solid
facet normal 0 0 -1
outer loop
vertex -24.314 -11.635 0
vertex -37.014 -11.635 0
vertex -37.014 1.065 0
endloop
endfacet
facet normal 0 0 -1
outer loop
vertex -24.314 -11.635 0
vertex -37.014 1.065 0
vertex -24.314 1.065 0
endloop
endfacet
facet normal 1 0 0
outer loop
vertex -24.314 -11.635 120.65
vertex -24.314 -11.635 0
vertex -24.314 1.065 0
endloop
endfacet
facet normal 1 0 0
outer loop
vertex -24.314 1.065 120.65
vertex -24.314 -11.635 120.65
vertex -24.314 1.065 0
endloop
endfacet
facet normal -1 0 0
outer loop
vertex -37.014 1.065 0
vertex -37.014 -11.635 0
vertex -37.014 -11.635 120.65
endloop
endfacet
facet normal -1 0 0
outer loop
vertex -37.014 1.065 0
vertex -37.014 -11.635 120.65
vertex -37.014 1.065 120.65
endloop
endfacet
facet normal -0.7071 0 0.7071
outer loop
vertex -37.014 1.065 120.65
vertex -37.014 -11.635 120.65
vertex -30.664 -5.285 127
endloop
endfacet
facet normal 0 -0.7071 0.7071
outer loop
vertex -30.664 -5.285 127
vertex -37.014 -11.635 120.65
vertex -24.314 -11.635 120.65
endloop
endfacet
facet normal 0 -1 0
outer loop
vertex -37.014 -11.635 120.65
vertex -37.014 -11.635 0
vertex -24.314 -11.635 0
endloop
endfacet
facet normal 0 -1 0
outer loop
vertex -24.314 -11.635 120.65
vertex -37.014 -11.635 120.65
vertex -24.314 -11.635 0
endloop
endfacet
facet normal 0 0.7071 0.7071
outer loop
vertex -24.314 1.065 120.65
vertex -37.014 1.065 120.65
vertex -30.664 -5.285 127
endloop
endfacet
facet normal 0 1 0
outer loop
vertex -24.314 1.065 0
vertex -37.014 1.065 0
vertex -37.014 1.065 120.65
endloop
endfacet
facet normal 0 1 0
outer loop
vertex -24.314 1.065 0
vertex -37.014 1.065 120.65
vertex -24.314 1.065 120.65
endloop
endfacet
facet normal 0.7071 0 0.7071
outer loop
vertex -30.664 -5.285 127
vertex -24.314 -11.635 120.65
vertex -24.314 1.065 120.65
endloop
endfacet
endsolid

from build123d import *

# Parameters (mm, degrees)
F0_W     = 12.7
F0_H     = 12.7
F1_DEPTH = 127
F2_SIZE  = 6.34999


# Not quite as in the source:
# - a fillet or chamfer is up to 0.001 mm smaller than in the source, because OpenCascade refuses the exact size


with BuildPart() as f1:
    # F0 (on Top) → F1 (new body)
    with BuildSketch(Plane.XY):
        with Locations((-30.6644180454, -5.2849810437)):
            Rectangle(F0_W, F0_H)
    extrude(amount=F1_DEPTH)

    # F2 (size 6.35 in the source; OpenCascade refuses exactly that, so slightly less here)
    f2_edges = [f1.edges().sort_by_distance(p)[0] for p in [
        (-37.014418, -5.284981, 127),
        (-24.314418, -5.284981, 127),
        (-30.664418, -11.634981, 127),
        (-30.664418, 1.065019, 127),
    ]]
    chamfer(f2_edges, length=F2_SIZE)


solid = f1.part
